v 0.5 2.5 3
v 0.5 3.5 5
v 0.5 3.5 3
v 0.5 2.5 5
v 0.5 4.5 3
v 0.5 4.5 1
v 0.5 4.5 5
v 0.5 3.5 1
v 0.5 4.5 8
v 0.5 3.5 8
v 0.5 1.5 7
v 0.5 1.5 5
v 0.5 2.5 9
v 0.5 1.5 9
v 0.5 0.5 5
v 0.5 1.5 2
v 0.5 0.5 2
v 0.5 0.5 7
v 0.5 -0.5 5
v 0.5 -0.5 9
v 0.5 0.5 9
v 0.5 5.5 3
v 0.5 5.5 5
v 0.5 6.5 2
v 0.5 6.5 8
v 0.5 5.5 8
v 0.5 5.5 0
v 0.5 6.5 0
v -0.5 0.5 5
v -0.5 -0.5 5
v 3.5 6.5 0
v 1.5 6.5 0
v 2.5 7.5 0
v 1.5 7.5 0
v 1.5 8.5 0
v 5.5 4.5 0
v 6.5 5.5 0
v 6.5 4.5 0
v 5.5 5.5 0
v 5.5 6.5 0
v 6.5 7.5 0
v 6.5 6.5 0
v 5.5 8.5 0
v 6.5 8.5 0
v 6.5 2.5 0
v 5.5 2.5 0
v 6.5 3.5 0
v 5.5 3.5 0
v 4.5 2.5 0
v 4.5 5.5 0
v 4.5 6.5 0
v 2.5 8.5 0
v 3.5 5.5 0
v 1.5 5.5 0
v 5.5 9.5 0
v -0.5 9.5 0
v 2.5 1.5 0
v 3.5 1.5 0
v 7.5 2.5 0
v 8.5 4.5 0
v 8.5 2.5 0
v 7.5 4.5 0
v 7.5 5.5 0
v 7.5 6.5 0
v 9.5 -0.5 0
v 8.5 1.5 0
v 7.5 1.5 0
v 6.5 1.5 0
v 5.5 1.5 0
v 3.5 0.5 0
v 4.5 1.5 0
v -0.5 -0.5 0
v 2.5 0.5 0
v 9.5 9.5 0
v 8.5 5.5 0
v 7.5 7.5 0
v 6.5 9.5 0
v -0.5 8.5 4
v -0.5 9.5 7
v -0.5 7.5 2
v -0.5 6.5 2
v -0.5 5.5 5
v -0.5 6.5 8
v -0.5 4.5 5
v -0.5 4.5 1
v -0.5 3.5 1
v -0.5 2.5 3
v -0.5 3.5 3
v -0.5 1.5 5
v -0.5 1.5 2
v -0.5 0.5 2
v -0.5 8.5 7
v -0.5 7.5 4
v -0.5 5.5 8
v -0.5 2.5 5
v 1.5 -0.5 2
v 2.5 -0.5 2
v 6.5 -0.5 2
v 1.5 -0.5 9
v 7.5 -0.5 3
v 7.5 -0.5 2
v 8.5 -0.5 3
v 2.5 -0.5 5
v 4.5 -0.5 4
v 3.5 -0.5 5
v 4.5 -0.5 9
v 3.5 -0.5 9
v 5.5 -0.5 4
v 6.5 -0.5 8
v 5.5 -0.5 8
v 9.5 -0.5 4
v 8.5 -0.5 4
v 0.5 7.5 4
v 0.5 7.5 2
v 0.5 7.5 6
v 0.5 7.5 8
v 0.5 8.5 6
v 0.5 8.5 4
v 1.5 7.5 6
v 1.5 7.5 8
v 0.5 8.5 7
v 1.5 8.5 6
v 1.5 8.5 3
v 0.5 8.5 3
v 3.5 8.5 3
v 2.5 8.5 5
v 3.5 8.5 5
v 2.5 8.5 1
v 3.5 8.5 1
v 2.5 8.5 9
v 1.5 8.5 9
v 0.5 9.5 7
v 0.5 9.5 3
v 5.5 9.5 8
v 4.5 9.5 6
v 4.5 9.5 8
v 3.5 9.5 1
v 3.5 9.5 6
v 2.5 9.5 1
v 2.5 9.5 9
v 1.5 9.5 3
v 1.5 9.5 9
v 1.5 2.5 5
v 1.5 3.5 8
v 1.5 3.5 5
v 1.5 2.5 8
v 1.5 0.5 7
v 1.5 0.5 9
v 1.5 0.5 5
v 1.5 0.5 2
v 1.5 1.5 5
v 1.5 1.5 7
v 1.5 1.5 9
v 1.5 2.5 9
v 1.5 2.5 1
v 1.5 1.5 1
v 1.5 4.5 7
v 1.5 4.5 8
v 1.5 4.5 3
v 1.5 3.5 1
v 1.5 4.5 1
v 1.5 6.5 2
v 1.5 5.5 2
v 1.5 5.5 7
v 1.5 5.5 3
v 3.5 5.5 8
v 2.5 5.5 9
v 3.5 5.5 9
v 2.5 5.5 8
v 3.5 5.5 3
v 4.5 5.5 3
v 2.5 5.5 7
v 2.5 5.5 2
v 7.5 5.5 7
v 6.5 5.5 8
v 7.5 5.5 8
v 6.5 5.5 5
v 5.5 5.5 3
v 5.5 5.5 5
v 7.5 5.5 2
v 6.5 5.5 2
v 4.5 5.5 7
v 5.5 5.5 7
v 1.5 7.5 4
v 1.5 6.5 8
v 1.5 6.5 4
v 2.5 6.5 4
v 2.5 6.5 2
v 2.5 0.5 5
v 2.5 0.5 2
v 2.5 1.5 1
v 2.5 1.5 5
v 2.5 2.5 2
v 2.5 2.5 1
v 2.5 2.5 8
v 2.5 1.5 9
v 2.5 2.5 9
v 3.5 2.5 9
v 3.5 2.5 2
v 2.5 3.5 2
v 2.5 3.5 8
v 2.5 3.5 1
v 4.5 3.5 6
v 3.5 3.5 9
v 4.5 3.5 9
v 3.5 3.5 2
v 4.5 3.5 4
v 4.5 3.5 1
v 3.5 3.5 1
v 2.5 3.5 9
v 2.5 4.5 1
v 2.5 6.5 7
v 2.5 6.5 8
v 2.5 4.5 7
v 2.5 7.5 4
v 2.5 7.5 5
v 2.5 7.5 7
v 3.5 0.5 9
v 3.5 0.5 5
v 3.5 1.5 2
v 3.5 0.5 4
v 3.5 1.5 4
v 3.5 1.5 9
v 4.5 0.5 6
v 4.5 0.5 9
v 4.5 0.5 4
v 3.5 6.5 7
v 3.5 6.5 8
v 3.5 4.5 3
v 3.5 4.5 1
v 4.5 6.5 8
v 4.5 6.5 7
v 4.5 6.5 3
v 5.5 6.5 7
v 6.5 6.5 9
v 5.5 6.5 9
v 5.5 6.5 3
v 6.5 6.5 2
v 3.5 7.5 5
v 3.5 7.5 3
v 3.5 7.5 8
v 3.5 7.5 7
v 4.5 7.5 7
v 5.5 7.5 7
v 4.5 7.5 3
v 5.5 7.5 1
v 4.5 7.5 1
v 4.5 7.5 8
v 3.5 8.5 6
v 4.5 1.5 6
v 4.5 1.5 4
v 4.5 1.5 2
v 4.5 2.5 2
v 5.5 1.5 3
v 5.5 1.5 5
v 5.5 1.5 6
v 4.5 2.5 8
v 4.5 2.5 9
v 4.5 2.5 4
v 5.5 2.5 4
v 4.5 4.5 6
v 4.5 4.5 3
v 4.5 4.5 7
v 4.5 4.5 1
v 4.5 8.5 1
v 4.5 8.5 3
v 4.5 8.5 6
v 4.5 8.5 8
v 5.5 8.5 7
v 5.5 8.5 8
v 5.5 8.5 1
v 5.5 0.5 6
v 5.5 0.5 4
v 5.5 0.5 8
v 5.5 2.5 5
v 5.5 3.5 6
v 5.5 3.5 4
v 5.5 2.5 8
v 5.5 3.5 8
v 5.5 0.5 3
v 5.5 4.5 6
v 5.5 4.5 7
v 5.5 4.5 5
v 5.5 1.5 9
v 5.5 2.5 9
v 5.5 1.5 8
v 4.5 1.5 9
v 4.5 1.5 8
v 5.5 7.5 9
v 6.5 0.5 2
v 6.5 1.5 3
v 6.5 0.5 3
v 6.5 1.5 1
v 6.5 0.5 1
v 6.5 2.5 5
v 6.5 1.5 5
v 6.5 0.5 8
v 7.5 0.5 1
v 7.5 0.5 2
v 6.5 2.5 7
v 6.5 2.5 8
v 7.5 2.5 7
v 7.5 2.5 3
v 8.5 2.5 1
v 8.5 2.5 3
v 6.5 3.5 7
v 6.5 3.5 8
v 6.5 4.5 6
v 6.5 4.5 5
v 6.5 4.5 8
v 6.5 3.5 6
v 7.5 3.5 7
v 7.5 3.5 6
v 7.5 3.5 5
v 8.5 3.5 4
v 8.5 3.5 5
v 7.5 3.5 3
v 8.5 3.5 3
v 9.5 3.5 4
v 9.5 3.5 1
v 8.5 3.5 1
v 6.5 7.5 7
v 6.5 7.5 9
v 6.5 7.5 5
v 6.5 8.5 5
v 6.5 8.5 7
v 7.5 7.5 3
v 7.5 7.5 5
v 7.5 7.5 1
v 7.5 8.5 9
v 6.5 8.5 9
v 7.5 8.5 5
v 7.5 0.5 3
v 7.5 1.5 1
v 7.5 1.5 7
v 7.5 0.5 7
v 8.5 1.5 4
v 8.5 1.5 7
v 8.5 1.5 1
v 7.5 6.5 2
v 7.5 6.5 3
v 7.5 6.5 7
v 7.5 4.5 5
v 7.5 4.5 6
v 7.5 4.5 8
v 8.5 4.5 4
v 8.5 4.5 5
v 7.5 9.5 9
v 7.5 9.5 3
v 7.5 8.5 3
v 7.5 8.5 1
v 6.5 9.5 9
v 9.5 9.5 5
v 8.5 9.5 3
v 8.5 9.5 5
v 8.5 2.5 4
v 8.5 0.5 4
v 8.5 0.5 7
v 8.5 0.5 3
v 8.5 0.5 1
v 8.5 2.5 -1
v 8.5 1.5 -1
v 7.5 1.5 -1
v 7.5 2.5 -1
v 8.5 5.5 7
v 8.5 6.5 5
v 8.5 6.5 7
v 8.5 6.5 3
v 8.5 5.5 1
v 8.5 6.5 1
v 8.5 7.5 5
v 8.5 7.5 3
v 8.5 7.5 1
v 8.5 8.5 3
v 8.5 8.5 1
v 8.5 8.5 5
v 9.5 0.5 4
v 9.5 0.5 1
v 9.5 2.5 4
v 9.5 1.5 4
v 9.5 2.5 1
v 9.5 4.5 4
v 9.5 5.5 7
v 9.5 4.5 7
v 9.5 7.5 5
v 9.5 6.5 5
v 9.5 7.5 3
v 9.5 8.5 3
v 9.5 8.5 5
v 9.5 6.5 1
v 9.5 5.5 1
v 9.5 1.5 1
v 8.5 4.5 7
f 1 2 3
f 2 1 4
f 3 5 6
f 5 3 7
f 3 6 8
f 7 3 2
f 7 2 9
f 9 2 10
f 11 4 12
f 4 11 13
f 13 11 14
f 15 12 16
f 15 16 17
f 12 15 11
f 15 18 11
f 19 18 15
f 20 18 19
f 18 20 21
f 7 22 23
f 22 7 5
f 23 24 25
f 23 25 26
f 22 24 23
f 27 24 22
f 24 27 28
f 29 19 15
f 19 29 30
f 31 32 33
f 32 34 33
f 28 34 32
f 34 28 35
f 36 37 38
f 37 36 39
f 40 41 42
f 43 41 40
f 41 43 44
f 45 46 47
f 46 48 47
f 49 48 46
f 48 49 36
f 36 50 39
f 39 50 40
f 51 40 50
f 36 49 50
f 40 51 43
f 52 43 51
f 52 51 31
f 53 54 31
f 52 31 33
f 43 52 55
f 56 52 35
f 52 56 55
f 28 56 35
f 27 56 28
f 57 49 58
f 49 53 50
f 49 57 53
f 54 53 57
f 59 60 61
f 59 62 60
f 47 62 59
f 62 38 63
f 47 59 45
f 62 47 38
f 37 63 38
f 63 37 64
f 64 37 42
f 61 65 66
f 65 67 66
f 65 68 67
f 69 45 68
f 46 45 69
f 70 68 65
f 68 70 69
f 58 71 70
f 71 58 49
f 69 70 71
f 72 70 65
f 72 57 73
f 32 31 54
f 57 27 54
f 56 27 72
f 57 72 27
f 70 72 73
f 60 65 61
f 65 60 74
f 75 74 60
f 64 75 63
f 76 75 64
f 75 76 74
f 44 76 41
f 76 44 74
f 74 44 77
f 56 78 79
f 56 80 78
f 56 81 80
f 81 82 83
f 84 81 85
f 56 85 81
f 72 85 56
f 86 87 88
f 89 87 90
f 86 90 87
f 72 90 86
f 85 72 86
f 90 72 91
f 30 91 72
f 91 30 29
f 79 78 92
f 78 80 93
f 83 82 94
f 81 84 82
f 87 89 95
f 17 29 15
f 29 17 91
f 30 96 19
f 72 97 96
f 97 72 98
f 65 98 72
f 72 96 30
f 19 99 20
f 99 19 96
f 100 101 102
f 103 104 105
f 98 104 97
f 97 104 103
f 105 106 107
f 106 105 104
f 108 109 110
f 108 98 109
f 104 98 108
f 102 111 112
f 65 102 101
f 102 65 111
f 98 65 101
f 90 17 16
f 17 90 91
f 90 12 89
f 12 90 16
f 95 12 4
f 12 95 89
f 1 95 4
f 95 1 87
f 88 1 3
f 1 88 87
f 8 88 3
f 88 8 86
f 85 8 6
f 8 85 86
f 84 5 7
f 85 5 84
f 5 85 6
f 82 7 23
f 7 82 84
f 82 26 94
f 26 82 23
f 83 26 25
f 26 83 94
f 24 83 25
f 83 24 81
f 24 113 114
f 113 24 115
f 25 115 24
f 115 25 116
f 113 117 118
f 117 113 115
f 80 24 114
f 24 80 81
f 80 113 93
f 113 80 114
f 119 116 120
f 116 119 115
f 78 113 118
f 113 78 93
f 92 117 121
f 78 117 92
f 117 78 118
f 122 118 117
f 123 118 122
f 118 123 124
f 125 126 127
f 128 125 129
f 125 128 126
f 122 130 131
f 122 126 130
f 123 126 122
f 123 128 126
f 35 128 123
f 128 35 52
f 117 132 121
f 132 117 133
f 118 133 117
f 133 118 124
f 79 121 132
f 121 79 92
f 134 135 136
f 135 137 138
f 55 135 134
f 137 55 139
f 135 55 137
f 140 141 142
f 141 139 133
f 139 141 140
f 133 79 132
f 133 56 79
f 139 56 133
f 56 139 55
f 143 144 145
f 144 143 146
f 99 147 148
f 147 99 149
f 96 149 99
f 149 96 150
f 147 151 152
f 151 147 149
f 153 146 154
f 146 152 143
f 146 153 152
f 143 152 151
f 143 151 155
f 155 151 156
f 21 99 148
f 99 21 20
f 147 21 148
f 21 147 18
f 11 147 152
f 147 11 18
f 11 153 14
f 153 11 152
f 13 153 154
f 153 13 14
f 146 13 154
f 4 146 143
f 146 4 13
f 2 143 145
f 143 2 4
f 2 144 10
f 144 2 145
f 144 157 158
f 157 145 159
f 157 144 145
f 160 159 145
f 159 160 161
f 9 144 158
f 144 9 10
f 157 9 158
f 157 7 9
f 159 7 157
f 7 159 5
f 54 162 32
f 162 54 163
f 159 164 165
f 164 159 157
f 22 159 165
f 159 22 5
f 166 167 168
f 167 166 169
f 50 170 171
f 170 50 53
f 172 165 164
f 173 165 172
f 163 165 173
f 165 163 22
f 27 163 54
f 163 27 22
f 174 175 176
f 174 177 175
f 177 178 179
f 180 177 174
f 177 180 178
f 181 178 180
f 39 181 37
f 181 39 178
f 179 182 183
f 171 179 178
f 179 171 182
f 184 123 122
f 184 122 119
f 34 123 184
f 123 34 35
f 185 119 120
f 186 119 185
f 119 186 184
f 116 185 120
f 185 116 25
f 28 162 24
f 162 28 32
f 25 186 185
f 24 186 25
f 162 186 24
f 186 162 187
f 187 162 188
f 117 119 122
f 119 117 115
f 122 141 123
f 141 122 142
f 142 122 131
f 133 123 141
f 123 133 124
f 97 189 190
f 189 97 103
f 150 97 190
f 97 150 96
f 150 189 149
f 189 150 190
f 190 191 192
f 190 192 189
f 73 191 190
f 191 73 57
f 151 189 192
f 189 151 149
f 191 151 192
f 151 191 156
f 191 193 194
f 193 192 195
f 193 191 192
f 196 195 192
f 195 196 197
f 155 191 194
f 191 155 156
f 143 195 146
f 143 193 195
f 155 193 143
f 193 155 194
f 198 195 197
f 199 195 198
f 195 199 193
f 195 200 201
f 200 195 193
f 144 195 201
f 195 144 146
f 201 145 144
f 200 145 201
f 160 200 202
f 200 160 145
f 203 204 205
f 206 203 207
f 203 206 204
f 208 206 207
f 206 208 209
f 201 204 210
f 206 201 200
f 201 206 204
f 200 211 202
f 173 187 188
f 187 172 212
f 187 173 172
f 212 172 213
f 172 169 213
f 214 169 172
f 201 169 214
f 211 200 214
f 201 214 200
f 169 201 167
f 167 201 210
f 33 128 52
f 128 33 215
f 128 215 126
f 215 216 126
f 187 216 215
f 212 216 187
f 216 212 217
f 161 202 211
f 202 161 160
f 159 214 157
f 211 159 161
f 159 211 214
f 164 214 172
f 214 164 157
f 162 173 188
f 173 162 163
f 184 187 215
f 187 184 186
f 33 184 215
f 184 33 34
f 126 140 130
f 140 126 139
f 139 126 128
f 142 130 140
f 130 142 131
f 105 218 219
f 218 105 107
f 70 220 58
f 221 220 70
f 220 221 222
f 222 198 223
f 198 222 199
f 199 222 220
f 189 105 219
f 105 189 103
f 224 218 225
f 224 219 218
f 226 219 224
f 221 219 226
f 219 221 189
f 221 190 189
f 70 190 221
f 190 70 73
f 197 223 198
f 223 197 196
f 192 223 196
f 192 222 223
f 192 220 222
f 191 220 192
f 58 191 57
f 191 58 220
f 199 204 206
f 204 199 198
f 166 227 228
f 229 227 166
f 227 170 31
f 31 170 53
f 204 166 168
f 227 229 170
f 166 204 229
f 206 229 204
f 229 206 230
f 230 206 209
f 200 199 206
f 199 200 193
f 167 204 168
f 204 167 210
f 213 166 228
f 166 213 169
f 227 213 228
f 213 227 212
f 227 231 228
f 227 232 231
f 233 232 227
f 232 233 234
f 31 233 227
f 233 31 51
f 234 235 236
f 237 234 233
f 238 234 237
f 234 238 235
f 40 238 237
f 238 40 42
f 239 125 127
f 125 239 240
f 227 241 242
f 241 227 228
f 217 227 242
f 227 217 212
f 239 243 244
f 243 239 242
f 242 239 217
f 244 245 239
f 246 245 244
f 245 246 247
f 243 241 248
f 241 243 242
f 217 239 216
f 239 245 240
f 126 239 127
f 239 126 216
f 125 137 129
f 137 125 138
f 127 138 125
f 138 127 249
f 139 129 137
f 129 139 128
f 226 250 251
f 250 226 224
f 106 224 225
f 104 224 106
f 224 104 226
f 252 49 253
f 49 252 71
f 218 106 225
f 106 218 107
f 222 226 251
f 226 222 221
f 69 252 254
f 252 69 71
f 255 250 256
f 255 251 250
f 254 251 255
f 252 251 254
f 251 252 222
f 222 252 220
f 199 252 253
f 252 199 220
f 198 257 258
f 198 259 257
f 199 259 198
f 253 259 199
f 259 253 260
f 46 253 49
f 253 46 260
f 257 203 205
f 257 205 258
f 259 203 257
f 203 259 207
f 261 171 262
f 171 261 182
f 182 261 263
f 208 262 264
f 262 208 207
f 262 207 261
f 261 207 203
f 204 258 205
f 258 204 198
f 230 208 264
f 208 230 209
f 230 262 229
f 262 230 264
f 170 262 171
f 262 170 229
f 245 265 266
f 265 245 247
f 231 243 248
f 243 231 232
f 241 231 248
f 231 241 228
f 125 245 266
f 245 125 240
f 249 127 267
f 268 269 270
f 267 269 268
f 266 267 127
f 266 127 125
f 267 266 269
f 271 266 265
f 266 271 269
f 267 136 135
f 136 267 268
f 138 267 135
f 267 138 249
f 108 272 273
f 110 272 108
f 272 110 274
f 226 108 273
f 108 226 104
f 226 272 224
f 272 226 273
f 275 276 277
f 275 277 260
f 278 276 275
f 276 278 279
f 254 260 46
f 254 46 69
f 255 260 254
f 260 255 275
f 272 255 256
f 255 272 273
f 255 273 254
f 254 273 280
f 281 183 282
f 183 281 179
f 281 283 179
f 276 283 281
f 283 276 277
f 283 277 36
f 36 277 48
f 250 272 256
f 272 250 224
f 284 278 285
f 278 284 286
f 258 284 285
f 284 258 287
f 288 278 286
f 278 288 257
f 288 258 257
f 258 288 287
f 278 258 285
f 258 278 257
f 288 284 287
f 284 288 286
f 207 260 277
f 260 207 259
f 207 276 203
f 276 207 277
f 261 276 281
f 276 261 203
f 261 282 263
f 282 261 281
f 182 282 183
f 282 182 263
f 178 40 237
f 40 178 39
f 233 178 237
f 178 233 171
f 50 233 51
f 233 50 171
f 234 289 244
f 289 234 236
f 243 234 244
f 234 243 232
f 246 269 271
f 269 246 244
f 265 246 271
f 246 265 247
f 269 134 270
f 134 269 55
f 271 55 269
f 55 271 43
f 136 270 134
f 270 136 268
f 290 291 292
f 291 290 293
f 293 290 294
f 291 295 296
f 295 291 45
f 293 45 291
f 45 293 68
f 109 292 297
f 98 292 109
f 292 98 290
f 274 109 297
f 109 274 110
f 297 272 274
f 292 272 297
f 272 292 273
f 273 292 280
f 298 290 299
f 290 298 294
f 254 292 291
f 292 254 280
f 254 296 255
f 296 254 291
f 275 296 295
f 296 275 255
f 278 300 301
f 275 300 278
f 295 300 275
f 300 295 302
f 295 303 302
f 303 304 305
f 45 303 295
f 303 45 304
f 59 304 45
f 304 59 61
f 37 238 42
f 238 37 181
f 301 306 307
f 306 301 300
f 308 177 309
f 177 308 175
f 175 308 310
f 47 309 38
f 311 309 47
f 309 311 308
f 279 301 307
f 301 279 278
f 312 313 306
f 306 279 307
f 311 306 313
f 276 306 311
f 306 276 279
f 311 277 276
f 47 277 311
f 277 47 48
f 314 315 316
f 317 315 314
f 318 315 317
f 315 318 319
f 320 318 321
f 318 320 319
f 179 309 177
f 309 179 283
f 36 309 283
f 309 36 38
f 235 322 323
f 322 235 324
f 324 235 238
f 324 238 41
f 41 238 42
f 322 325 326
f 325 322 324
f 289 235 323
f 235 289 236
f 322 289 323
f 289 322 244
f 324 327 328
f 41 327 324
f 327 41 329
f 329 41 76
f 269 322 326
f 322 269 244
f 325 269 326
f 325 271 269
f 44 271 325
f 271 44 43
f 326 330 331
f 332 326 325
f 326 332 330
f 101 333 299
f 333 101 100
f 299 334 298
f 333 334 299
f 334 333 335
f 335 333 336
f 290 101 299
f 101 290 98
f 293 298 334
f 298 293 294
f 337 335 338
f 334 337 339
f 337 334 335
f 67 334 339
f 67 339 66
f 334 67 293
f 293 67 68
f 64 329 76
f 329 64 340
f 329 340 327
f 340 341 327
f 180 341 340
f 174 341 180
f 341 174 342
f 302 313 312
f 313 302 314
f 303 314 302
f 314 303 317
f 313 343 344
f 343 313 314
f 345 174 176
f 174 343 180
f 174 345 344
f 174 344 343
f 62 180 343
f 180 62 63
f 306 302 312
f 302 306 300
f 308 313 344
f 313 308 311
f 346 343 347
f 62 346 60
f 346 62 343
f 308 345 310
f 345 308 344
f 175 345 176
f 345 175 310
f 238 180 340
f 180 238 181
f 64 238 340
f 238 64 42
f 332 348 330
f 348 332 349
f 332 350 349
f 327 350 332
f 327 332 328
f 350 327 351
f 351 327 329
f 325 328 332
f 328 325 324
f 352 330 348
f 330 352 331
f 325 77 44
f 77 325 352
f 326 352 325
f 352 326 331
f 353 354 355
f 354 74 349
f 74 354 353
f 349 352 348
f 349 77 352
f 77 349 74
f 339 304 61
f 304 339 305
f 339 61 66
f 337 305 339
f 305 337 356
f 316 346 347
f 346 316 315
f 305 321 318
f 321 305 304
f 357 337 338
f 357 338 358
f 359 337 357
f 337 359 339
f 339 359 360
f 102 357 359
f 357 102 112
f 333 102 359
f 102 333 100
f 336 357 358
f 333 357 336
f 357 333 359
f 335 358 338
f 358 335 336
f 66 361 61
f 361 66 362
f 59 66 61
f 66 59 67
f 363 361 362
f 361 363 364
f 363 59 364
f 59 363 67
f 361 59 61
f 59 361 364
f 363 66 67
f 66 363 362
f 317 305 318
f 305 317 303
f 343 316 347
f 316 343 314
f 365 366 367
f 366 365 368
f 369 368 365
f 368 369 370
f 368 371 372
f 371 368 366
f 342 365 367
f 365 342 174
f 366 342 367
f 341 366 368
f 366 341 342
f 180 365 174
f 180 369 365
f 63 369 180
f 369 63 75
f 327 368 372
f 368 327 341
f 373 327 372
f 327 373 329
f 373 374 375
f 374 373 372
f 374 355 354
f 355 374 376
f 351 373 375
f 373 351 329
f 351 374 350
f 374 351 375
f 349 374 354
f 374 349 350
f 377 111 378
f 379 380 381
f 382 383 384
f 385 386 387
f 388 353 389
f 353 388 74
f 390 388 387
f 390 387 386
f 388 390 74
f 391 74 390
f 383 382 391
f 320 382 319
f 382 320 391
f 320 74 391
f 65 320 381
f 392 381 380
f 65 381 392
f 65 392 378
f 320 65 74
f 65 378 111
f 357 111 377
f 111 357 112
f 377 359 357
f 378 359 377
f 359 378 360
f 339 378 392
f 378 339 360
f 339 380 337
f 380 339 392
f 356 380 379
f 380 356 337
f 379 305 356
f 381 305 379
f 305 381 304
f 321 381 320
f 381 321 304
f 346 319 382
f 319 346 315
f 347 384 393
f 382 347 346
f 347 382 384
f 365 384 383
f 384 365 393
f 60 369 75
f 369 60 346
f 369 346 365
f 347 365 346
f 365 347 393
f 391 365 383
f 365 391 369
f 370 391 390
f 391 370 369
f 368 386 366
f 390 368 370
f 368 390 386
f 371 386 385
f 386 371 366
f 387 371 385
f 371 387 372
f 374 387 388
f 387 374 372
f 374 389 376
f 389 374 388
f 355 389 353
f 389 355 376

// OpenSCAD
union() {
    translate([0, 0, 2.5]) cube([1, 1, 5], center=true);
    translate([0, 1, 1.0]) cube([1, 1, 2], center=true);
    translate([0, 2, 2.5]) cube([1, 1, 5], center=true);
    translate([0, 3, 1.5]) cube([1, 1, 3], center=true);
    translate([0, 4, 0.5]) cube([1, 1, 1], center=true);
    translate([0, 5, 2.5]) cube([1, 1, 5], center=true);
    translate([0, 6, 4.0]) cube([1, 1, 8], center=true);
    translate([0, 7, 1.0]) cube([1, 1, 2], center=true);
    translate([0, 8, 2.0]) cube([1, 1, 4], center=true);
    translate([0, 9, 3.5]) cube([1, 1, 7], center=true);
    translate([1, 0, 4.5]) cube([1, 1, 9], center=true);
    translate([1, 1, 3.5]) cube([1, 1, 7], center=true);
    translate([1, 2, 4.5]) cube([1, 1, 9], center=true);
    translate([1, 3, 2.5]) cube([1, 1, 5], center=true);
    translate([1, 4, 4.0]) cube([1, 1, 8], center=true);
    translate([1, 5, 1.5]) cube([1, 1, 3], center=true);
    translate([1, 7, 4.0]) cube([1, 1, 8], center=true);
    translate([1, 8, 3.0]) cube([1, 1, 6], center=true);
    translate([1, 9, 1.5]) cube([1, 1, 3], center=true);
    translate([2, 0, 1.0]) cube([1, 1, 2], center=true);
    translate([2, 1, 2.5]) cube([1, 1, 5], center=true);
    translate([2, 2, 0.5]) cube([1, 1, 1], center=true);
    translate([2, 3, 4.0]) cube([1, 1, 8], center=true);
    translate([2, 4, 0.5]) cube([1, 1, 1], center=true);
    translate([2, 5, 3.5]) cube([1, 1, 7], center=true);
    translate([2, 6, 1.0]) cube([1, 1, 2], center=true);
    translate([2, 7, 2.0]) cube([1, 1, 4], center=true);
    translate([2, 9, 4.5]) cube([1, 1, 9], center=true);
    translate([3, 0, 2.5]) cube([1, 1, 5], center=true);
    translate([3, 2, 4.5]) cube([1, 1, 9], center=true);
    translate([3, 3, 1.0]) cube([1, 1, 2], center=true);
    translate([3, 4, 4.5]) cube([1, 1, 9], center=true);
    translate([3, 5, 4.5]) cube([1, 1, 9], center=true);
    translate([3, 6, 4.0]) cube([1, 1, 8], center=true);
    translate([3, 7, 3.5]) cube([1, 1, 7], center=true);
    translate([3, 8, 2.5]) cube([1, 1, 5], center=true);
    translate([3, 9, 0.5]) cube([1, 1, 1], center=true);
    translate([4, 0, 4.5]) cube([1, 1, 9], center=true);
    translate([4, 1, 2.0]) cube([1, 1, 4], center=true);
    translate([4, 2, 1.0]) cube([1, 1, 2], center=true);
    translate([4, 3, 4.5]) cube([1, 1, 9], center=true);
    translate([4, 4, 0.5]) cube([1, 1, 1], center=true);
    translate([4, 5, 1.5]) cube([1, 1, 3], center=true);
    translate([4, 7, 4.0]) cube([1, 1, 8], center=true);
    translate([4, 8, 1.5]) cube([1, 1, 3], center=true);
    translate([4, 9, 3.0]) cube([1, 1, 6], center=true);
    translate([5, 0, 2.0]) cube([1, 1, 4], center=true);
    translate([5, 1, 3.0]) cube([1, 1, 6], center=true);
    translate([5, 2, 8.5]) color([0, 0, 1]) cube([1, 1, 1], center=true);
    translate([5, 3, 2.0]) cube([1, 1, 4], center=true);
    translate([5, 4, 3.0]) cube([1, 1, 6], center=true);
    translate([5, 5, 3.5]) cube([1, 1, 7], center=true);
    translate([5, 6, 1.5]) cube([1, 1, 3], center=true);
    translate([5, 7, 3.5]) cube([1, 1, 7], center=true);
    translate([5, 8, 0.5]) cube([1, 1, 1], center=true);
    translate([5, 9, 4.0]) cube([1, 1, 8], center=true);
    translate([6, 0, 4.0]) cube([1, 1, 8], center=true);
    translate([6, 1, 1.5]) cube([1, 1, 3], center=true);
    translate([6, 2, 2.5]) cube([1, 1, 5], center=true);
    translate([6, 3, 4.0]) cube([1, 1, 8], center=true);
    translate([6, 5, 2.5]) cube([1, 1, 5], center=true);
    translate([6, 7, 4.5]) cube([1, 1, 9], center=true);
    translate([6, 8, 3.5]) cube([1, 1, 7], center=true);
    translate([7, 0, 1.0]) cube([1, 1, 2], center=true);
    translate([7, 1, 0.5]) cube([1, 1, 1], center=true);
    translate([7, 3, 3.5]) cube([1, 1, 7], center=true);
    translate([7, 4, 3.0]) cube([1, 1, 6], center=true);
    translate([7, 5, 4.0]) cube([1, 1, 8], center=true);
    translate([7, 6, 1.0]) cube([1, 1, 2], center=true);
    translate([7, 8, 2.5]) cube([1, 1, 5], center=true);
    translate([7, 9, 4.5]) cube([1, 1, 9], center=true);
    translate([8, 0, 1.5]) cube([1, 1, 3], center=true);
    translate([8, 1, 3.5]) cube([1, 1, 7], center=true);
    translate([8, 2, -0.5]) color([1, 0, 0]) cube([1, 1, 1], center=true);
    translate([8, 3, 1.5]) cube([1, 1, 3], center=true);
    translate([8, 4, 2.5]) cube([1, 1, 5], center=true);
    translate([8, 6, 3.5]) cube([1, 1, 7], center=true);
    translate([8, 7, 1.5]) cube([1, 1, 3], center=true);
    translate([8, 8, 0.5]) cube([1, 1, 1], center=true);
    translate([8, 9, 1.5]) cube([1, 1, 3], center=true);
    translate([9, 0, 2.0]) cube([1, 1, 4], center=true);
    translate([9, 1, 0.5]) cube([1, 1, 1], center=true);
    translate([9, 2, 2.0]) cube([1, 1, 4], center=true);
    translate([9, 3, 0.5]) cube([1, 1, 1], center=true);
    translate([9, 4, 2.0]) cube([1, 1, 4], center=true);
    translate([9, 5, 3.5]) cube([1, 1, 7], center=true);
    translate([9, 6, 0.5]) cube([1, 1, 1], center=true);
    translate([9, 7, 2.5]) cube([1, 1, 5], center=true);
    translate([9, 8, 1.5]) cube([1, 1, 3], center=true);
    translate([9, 9, 2.5]) cube([1, 1, 5], center=true);
}
